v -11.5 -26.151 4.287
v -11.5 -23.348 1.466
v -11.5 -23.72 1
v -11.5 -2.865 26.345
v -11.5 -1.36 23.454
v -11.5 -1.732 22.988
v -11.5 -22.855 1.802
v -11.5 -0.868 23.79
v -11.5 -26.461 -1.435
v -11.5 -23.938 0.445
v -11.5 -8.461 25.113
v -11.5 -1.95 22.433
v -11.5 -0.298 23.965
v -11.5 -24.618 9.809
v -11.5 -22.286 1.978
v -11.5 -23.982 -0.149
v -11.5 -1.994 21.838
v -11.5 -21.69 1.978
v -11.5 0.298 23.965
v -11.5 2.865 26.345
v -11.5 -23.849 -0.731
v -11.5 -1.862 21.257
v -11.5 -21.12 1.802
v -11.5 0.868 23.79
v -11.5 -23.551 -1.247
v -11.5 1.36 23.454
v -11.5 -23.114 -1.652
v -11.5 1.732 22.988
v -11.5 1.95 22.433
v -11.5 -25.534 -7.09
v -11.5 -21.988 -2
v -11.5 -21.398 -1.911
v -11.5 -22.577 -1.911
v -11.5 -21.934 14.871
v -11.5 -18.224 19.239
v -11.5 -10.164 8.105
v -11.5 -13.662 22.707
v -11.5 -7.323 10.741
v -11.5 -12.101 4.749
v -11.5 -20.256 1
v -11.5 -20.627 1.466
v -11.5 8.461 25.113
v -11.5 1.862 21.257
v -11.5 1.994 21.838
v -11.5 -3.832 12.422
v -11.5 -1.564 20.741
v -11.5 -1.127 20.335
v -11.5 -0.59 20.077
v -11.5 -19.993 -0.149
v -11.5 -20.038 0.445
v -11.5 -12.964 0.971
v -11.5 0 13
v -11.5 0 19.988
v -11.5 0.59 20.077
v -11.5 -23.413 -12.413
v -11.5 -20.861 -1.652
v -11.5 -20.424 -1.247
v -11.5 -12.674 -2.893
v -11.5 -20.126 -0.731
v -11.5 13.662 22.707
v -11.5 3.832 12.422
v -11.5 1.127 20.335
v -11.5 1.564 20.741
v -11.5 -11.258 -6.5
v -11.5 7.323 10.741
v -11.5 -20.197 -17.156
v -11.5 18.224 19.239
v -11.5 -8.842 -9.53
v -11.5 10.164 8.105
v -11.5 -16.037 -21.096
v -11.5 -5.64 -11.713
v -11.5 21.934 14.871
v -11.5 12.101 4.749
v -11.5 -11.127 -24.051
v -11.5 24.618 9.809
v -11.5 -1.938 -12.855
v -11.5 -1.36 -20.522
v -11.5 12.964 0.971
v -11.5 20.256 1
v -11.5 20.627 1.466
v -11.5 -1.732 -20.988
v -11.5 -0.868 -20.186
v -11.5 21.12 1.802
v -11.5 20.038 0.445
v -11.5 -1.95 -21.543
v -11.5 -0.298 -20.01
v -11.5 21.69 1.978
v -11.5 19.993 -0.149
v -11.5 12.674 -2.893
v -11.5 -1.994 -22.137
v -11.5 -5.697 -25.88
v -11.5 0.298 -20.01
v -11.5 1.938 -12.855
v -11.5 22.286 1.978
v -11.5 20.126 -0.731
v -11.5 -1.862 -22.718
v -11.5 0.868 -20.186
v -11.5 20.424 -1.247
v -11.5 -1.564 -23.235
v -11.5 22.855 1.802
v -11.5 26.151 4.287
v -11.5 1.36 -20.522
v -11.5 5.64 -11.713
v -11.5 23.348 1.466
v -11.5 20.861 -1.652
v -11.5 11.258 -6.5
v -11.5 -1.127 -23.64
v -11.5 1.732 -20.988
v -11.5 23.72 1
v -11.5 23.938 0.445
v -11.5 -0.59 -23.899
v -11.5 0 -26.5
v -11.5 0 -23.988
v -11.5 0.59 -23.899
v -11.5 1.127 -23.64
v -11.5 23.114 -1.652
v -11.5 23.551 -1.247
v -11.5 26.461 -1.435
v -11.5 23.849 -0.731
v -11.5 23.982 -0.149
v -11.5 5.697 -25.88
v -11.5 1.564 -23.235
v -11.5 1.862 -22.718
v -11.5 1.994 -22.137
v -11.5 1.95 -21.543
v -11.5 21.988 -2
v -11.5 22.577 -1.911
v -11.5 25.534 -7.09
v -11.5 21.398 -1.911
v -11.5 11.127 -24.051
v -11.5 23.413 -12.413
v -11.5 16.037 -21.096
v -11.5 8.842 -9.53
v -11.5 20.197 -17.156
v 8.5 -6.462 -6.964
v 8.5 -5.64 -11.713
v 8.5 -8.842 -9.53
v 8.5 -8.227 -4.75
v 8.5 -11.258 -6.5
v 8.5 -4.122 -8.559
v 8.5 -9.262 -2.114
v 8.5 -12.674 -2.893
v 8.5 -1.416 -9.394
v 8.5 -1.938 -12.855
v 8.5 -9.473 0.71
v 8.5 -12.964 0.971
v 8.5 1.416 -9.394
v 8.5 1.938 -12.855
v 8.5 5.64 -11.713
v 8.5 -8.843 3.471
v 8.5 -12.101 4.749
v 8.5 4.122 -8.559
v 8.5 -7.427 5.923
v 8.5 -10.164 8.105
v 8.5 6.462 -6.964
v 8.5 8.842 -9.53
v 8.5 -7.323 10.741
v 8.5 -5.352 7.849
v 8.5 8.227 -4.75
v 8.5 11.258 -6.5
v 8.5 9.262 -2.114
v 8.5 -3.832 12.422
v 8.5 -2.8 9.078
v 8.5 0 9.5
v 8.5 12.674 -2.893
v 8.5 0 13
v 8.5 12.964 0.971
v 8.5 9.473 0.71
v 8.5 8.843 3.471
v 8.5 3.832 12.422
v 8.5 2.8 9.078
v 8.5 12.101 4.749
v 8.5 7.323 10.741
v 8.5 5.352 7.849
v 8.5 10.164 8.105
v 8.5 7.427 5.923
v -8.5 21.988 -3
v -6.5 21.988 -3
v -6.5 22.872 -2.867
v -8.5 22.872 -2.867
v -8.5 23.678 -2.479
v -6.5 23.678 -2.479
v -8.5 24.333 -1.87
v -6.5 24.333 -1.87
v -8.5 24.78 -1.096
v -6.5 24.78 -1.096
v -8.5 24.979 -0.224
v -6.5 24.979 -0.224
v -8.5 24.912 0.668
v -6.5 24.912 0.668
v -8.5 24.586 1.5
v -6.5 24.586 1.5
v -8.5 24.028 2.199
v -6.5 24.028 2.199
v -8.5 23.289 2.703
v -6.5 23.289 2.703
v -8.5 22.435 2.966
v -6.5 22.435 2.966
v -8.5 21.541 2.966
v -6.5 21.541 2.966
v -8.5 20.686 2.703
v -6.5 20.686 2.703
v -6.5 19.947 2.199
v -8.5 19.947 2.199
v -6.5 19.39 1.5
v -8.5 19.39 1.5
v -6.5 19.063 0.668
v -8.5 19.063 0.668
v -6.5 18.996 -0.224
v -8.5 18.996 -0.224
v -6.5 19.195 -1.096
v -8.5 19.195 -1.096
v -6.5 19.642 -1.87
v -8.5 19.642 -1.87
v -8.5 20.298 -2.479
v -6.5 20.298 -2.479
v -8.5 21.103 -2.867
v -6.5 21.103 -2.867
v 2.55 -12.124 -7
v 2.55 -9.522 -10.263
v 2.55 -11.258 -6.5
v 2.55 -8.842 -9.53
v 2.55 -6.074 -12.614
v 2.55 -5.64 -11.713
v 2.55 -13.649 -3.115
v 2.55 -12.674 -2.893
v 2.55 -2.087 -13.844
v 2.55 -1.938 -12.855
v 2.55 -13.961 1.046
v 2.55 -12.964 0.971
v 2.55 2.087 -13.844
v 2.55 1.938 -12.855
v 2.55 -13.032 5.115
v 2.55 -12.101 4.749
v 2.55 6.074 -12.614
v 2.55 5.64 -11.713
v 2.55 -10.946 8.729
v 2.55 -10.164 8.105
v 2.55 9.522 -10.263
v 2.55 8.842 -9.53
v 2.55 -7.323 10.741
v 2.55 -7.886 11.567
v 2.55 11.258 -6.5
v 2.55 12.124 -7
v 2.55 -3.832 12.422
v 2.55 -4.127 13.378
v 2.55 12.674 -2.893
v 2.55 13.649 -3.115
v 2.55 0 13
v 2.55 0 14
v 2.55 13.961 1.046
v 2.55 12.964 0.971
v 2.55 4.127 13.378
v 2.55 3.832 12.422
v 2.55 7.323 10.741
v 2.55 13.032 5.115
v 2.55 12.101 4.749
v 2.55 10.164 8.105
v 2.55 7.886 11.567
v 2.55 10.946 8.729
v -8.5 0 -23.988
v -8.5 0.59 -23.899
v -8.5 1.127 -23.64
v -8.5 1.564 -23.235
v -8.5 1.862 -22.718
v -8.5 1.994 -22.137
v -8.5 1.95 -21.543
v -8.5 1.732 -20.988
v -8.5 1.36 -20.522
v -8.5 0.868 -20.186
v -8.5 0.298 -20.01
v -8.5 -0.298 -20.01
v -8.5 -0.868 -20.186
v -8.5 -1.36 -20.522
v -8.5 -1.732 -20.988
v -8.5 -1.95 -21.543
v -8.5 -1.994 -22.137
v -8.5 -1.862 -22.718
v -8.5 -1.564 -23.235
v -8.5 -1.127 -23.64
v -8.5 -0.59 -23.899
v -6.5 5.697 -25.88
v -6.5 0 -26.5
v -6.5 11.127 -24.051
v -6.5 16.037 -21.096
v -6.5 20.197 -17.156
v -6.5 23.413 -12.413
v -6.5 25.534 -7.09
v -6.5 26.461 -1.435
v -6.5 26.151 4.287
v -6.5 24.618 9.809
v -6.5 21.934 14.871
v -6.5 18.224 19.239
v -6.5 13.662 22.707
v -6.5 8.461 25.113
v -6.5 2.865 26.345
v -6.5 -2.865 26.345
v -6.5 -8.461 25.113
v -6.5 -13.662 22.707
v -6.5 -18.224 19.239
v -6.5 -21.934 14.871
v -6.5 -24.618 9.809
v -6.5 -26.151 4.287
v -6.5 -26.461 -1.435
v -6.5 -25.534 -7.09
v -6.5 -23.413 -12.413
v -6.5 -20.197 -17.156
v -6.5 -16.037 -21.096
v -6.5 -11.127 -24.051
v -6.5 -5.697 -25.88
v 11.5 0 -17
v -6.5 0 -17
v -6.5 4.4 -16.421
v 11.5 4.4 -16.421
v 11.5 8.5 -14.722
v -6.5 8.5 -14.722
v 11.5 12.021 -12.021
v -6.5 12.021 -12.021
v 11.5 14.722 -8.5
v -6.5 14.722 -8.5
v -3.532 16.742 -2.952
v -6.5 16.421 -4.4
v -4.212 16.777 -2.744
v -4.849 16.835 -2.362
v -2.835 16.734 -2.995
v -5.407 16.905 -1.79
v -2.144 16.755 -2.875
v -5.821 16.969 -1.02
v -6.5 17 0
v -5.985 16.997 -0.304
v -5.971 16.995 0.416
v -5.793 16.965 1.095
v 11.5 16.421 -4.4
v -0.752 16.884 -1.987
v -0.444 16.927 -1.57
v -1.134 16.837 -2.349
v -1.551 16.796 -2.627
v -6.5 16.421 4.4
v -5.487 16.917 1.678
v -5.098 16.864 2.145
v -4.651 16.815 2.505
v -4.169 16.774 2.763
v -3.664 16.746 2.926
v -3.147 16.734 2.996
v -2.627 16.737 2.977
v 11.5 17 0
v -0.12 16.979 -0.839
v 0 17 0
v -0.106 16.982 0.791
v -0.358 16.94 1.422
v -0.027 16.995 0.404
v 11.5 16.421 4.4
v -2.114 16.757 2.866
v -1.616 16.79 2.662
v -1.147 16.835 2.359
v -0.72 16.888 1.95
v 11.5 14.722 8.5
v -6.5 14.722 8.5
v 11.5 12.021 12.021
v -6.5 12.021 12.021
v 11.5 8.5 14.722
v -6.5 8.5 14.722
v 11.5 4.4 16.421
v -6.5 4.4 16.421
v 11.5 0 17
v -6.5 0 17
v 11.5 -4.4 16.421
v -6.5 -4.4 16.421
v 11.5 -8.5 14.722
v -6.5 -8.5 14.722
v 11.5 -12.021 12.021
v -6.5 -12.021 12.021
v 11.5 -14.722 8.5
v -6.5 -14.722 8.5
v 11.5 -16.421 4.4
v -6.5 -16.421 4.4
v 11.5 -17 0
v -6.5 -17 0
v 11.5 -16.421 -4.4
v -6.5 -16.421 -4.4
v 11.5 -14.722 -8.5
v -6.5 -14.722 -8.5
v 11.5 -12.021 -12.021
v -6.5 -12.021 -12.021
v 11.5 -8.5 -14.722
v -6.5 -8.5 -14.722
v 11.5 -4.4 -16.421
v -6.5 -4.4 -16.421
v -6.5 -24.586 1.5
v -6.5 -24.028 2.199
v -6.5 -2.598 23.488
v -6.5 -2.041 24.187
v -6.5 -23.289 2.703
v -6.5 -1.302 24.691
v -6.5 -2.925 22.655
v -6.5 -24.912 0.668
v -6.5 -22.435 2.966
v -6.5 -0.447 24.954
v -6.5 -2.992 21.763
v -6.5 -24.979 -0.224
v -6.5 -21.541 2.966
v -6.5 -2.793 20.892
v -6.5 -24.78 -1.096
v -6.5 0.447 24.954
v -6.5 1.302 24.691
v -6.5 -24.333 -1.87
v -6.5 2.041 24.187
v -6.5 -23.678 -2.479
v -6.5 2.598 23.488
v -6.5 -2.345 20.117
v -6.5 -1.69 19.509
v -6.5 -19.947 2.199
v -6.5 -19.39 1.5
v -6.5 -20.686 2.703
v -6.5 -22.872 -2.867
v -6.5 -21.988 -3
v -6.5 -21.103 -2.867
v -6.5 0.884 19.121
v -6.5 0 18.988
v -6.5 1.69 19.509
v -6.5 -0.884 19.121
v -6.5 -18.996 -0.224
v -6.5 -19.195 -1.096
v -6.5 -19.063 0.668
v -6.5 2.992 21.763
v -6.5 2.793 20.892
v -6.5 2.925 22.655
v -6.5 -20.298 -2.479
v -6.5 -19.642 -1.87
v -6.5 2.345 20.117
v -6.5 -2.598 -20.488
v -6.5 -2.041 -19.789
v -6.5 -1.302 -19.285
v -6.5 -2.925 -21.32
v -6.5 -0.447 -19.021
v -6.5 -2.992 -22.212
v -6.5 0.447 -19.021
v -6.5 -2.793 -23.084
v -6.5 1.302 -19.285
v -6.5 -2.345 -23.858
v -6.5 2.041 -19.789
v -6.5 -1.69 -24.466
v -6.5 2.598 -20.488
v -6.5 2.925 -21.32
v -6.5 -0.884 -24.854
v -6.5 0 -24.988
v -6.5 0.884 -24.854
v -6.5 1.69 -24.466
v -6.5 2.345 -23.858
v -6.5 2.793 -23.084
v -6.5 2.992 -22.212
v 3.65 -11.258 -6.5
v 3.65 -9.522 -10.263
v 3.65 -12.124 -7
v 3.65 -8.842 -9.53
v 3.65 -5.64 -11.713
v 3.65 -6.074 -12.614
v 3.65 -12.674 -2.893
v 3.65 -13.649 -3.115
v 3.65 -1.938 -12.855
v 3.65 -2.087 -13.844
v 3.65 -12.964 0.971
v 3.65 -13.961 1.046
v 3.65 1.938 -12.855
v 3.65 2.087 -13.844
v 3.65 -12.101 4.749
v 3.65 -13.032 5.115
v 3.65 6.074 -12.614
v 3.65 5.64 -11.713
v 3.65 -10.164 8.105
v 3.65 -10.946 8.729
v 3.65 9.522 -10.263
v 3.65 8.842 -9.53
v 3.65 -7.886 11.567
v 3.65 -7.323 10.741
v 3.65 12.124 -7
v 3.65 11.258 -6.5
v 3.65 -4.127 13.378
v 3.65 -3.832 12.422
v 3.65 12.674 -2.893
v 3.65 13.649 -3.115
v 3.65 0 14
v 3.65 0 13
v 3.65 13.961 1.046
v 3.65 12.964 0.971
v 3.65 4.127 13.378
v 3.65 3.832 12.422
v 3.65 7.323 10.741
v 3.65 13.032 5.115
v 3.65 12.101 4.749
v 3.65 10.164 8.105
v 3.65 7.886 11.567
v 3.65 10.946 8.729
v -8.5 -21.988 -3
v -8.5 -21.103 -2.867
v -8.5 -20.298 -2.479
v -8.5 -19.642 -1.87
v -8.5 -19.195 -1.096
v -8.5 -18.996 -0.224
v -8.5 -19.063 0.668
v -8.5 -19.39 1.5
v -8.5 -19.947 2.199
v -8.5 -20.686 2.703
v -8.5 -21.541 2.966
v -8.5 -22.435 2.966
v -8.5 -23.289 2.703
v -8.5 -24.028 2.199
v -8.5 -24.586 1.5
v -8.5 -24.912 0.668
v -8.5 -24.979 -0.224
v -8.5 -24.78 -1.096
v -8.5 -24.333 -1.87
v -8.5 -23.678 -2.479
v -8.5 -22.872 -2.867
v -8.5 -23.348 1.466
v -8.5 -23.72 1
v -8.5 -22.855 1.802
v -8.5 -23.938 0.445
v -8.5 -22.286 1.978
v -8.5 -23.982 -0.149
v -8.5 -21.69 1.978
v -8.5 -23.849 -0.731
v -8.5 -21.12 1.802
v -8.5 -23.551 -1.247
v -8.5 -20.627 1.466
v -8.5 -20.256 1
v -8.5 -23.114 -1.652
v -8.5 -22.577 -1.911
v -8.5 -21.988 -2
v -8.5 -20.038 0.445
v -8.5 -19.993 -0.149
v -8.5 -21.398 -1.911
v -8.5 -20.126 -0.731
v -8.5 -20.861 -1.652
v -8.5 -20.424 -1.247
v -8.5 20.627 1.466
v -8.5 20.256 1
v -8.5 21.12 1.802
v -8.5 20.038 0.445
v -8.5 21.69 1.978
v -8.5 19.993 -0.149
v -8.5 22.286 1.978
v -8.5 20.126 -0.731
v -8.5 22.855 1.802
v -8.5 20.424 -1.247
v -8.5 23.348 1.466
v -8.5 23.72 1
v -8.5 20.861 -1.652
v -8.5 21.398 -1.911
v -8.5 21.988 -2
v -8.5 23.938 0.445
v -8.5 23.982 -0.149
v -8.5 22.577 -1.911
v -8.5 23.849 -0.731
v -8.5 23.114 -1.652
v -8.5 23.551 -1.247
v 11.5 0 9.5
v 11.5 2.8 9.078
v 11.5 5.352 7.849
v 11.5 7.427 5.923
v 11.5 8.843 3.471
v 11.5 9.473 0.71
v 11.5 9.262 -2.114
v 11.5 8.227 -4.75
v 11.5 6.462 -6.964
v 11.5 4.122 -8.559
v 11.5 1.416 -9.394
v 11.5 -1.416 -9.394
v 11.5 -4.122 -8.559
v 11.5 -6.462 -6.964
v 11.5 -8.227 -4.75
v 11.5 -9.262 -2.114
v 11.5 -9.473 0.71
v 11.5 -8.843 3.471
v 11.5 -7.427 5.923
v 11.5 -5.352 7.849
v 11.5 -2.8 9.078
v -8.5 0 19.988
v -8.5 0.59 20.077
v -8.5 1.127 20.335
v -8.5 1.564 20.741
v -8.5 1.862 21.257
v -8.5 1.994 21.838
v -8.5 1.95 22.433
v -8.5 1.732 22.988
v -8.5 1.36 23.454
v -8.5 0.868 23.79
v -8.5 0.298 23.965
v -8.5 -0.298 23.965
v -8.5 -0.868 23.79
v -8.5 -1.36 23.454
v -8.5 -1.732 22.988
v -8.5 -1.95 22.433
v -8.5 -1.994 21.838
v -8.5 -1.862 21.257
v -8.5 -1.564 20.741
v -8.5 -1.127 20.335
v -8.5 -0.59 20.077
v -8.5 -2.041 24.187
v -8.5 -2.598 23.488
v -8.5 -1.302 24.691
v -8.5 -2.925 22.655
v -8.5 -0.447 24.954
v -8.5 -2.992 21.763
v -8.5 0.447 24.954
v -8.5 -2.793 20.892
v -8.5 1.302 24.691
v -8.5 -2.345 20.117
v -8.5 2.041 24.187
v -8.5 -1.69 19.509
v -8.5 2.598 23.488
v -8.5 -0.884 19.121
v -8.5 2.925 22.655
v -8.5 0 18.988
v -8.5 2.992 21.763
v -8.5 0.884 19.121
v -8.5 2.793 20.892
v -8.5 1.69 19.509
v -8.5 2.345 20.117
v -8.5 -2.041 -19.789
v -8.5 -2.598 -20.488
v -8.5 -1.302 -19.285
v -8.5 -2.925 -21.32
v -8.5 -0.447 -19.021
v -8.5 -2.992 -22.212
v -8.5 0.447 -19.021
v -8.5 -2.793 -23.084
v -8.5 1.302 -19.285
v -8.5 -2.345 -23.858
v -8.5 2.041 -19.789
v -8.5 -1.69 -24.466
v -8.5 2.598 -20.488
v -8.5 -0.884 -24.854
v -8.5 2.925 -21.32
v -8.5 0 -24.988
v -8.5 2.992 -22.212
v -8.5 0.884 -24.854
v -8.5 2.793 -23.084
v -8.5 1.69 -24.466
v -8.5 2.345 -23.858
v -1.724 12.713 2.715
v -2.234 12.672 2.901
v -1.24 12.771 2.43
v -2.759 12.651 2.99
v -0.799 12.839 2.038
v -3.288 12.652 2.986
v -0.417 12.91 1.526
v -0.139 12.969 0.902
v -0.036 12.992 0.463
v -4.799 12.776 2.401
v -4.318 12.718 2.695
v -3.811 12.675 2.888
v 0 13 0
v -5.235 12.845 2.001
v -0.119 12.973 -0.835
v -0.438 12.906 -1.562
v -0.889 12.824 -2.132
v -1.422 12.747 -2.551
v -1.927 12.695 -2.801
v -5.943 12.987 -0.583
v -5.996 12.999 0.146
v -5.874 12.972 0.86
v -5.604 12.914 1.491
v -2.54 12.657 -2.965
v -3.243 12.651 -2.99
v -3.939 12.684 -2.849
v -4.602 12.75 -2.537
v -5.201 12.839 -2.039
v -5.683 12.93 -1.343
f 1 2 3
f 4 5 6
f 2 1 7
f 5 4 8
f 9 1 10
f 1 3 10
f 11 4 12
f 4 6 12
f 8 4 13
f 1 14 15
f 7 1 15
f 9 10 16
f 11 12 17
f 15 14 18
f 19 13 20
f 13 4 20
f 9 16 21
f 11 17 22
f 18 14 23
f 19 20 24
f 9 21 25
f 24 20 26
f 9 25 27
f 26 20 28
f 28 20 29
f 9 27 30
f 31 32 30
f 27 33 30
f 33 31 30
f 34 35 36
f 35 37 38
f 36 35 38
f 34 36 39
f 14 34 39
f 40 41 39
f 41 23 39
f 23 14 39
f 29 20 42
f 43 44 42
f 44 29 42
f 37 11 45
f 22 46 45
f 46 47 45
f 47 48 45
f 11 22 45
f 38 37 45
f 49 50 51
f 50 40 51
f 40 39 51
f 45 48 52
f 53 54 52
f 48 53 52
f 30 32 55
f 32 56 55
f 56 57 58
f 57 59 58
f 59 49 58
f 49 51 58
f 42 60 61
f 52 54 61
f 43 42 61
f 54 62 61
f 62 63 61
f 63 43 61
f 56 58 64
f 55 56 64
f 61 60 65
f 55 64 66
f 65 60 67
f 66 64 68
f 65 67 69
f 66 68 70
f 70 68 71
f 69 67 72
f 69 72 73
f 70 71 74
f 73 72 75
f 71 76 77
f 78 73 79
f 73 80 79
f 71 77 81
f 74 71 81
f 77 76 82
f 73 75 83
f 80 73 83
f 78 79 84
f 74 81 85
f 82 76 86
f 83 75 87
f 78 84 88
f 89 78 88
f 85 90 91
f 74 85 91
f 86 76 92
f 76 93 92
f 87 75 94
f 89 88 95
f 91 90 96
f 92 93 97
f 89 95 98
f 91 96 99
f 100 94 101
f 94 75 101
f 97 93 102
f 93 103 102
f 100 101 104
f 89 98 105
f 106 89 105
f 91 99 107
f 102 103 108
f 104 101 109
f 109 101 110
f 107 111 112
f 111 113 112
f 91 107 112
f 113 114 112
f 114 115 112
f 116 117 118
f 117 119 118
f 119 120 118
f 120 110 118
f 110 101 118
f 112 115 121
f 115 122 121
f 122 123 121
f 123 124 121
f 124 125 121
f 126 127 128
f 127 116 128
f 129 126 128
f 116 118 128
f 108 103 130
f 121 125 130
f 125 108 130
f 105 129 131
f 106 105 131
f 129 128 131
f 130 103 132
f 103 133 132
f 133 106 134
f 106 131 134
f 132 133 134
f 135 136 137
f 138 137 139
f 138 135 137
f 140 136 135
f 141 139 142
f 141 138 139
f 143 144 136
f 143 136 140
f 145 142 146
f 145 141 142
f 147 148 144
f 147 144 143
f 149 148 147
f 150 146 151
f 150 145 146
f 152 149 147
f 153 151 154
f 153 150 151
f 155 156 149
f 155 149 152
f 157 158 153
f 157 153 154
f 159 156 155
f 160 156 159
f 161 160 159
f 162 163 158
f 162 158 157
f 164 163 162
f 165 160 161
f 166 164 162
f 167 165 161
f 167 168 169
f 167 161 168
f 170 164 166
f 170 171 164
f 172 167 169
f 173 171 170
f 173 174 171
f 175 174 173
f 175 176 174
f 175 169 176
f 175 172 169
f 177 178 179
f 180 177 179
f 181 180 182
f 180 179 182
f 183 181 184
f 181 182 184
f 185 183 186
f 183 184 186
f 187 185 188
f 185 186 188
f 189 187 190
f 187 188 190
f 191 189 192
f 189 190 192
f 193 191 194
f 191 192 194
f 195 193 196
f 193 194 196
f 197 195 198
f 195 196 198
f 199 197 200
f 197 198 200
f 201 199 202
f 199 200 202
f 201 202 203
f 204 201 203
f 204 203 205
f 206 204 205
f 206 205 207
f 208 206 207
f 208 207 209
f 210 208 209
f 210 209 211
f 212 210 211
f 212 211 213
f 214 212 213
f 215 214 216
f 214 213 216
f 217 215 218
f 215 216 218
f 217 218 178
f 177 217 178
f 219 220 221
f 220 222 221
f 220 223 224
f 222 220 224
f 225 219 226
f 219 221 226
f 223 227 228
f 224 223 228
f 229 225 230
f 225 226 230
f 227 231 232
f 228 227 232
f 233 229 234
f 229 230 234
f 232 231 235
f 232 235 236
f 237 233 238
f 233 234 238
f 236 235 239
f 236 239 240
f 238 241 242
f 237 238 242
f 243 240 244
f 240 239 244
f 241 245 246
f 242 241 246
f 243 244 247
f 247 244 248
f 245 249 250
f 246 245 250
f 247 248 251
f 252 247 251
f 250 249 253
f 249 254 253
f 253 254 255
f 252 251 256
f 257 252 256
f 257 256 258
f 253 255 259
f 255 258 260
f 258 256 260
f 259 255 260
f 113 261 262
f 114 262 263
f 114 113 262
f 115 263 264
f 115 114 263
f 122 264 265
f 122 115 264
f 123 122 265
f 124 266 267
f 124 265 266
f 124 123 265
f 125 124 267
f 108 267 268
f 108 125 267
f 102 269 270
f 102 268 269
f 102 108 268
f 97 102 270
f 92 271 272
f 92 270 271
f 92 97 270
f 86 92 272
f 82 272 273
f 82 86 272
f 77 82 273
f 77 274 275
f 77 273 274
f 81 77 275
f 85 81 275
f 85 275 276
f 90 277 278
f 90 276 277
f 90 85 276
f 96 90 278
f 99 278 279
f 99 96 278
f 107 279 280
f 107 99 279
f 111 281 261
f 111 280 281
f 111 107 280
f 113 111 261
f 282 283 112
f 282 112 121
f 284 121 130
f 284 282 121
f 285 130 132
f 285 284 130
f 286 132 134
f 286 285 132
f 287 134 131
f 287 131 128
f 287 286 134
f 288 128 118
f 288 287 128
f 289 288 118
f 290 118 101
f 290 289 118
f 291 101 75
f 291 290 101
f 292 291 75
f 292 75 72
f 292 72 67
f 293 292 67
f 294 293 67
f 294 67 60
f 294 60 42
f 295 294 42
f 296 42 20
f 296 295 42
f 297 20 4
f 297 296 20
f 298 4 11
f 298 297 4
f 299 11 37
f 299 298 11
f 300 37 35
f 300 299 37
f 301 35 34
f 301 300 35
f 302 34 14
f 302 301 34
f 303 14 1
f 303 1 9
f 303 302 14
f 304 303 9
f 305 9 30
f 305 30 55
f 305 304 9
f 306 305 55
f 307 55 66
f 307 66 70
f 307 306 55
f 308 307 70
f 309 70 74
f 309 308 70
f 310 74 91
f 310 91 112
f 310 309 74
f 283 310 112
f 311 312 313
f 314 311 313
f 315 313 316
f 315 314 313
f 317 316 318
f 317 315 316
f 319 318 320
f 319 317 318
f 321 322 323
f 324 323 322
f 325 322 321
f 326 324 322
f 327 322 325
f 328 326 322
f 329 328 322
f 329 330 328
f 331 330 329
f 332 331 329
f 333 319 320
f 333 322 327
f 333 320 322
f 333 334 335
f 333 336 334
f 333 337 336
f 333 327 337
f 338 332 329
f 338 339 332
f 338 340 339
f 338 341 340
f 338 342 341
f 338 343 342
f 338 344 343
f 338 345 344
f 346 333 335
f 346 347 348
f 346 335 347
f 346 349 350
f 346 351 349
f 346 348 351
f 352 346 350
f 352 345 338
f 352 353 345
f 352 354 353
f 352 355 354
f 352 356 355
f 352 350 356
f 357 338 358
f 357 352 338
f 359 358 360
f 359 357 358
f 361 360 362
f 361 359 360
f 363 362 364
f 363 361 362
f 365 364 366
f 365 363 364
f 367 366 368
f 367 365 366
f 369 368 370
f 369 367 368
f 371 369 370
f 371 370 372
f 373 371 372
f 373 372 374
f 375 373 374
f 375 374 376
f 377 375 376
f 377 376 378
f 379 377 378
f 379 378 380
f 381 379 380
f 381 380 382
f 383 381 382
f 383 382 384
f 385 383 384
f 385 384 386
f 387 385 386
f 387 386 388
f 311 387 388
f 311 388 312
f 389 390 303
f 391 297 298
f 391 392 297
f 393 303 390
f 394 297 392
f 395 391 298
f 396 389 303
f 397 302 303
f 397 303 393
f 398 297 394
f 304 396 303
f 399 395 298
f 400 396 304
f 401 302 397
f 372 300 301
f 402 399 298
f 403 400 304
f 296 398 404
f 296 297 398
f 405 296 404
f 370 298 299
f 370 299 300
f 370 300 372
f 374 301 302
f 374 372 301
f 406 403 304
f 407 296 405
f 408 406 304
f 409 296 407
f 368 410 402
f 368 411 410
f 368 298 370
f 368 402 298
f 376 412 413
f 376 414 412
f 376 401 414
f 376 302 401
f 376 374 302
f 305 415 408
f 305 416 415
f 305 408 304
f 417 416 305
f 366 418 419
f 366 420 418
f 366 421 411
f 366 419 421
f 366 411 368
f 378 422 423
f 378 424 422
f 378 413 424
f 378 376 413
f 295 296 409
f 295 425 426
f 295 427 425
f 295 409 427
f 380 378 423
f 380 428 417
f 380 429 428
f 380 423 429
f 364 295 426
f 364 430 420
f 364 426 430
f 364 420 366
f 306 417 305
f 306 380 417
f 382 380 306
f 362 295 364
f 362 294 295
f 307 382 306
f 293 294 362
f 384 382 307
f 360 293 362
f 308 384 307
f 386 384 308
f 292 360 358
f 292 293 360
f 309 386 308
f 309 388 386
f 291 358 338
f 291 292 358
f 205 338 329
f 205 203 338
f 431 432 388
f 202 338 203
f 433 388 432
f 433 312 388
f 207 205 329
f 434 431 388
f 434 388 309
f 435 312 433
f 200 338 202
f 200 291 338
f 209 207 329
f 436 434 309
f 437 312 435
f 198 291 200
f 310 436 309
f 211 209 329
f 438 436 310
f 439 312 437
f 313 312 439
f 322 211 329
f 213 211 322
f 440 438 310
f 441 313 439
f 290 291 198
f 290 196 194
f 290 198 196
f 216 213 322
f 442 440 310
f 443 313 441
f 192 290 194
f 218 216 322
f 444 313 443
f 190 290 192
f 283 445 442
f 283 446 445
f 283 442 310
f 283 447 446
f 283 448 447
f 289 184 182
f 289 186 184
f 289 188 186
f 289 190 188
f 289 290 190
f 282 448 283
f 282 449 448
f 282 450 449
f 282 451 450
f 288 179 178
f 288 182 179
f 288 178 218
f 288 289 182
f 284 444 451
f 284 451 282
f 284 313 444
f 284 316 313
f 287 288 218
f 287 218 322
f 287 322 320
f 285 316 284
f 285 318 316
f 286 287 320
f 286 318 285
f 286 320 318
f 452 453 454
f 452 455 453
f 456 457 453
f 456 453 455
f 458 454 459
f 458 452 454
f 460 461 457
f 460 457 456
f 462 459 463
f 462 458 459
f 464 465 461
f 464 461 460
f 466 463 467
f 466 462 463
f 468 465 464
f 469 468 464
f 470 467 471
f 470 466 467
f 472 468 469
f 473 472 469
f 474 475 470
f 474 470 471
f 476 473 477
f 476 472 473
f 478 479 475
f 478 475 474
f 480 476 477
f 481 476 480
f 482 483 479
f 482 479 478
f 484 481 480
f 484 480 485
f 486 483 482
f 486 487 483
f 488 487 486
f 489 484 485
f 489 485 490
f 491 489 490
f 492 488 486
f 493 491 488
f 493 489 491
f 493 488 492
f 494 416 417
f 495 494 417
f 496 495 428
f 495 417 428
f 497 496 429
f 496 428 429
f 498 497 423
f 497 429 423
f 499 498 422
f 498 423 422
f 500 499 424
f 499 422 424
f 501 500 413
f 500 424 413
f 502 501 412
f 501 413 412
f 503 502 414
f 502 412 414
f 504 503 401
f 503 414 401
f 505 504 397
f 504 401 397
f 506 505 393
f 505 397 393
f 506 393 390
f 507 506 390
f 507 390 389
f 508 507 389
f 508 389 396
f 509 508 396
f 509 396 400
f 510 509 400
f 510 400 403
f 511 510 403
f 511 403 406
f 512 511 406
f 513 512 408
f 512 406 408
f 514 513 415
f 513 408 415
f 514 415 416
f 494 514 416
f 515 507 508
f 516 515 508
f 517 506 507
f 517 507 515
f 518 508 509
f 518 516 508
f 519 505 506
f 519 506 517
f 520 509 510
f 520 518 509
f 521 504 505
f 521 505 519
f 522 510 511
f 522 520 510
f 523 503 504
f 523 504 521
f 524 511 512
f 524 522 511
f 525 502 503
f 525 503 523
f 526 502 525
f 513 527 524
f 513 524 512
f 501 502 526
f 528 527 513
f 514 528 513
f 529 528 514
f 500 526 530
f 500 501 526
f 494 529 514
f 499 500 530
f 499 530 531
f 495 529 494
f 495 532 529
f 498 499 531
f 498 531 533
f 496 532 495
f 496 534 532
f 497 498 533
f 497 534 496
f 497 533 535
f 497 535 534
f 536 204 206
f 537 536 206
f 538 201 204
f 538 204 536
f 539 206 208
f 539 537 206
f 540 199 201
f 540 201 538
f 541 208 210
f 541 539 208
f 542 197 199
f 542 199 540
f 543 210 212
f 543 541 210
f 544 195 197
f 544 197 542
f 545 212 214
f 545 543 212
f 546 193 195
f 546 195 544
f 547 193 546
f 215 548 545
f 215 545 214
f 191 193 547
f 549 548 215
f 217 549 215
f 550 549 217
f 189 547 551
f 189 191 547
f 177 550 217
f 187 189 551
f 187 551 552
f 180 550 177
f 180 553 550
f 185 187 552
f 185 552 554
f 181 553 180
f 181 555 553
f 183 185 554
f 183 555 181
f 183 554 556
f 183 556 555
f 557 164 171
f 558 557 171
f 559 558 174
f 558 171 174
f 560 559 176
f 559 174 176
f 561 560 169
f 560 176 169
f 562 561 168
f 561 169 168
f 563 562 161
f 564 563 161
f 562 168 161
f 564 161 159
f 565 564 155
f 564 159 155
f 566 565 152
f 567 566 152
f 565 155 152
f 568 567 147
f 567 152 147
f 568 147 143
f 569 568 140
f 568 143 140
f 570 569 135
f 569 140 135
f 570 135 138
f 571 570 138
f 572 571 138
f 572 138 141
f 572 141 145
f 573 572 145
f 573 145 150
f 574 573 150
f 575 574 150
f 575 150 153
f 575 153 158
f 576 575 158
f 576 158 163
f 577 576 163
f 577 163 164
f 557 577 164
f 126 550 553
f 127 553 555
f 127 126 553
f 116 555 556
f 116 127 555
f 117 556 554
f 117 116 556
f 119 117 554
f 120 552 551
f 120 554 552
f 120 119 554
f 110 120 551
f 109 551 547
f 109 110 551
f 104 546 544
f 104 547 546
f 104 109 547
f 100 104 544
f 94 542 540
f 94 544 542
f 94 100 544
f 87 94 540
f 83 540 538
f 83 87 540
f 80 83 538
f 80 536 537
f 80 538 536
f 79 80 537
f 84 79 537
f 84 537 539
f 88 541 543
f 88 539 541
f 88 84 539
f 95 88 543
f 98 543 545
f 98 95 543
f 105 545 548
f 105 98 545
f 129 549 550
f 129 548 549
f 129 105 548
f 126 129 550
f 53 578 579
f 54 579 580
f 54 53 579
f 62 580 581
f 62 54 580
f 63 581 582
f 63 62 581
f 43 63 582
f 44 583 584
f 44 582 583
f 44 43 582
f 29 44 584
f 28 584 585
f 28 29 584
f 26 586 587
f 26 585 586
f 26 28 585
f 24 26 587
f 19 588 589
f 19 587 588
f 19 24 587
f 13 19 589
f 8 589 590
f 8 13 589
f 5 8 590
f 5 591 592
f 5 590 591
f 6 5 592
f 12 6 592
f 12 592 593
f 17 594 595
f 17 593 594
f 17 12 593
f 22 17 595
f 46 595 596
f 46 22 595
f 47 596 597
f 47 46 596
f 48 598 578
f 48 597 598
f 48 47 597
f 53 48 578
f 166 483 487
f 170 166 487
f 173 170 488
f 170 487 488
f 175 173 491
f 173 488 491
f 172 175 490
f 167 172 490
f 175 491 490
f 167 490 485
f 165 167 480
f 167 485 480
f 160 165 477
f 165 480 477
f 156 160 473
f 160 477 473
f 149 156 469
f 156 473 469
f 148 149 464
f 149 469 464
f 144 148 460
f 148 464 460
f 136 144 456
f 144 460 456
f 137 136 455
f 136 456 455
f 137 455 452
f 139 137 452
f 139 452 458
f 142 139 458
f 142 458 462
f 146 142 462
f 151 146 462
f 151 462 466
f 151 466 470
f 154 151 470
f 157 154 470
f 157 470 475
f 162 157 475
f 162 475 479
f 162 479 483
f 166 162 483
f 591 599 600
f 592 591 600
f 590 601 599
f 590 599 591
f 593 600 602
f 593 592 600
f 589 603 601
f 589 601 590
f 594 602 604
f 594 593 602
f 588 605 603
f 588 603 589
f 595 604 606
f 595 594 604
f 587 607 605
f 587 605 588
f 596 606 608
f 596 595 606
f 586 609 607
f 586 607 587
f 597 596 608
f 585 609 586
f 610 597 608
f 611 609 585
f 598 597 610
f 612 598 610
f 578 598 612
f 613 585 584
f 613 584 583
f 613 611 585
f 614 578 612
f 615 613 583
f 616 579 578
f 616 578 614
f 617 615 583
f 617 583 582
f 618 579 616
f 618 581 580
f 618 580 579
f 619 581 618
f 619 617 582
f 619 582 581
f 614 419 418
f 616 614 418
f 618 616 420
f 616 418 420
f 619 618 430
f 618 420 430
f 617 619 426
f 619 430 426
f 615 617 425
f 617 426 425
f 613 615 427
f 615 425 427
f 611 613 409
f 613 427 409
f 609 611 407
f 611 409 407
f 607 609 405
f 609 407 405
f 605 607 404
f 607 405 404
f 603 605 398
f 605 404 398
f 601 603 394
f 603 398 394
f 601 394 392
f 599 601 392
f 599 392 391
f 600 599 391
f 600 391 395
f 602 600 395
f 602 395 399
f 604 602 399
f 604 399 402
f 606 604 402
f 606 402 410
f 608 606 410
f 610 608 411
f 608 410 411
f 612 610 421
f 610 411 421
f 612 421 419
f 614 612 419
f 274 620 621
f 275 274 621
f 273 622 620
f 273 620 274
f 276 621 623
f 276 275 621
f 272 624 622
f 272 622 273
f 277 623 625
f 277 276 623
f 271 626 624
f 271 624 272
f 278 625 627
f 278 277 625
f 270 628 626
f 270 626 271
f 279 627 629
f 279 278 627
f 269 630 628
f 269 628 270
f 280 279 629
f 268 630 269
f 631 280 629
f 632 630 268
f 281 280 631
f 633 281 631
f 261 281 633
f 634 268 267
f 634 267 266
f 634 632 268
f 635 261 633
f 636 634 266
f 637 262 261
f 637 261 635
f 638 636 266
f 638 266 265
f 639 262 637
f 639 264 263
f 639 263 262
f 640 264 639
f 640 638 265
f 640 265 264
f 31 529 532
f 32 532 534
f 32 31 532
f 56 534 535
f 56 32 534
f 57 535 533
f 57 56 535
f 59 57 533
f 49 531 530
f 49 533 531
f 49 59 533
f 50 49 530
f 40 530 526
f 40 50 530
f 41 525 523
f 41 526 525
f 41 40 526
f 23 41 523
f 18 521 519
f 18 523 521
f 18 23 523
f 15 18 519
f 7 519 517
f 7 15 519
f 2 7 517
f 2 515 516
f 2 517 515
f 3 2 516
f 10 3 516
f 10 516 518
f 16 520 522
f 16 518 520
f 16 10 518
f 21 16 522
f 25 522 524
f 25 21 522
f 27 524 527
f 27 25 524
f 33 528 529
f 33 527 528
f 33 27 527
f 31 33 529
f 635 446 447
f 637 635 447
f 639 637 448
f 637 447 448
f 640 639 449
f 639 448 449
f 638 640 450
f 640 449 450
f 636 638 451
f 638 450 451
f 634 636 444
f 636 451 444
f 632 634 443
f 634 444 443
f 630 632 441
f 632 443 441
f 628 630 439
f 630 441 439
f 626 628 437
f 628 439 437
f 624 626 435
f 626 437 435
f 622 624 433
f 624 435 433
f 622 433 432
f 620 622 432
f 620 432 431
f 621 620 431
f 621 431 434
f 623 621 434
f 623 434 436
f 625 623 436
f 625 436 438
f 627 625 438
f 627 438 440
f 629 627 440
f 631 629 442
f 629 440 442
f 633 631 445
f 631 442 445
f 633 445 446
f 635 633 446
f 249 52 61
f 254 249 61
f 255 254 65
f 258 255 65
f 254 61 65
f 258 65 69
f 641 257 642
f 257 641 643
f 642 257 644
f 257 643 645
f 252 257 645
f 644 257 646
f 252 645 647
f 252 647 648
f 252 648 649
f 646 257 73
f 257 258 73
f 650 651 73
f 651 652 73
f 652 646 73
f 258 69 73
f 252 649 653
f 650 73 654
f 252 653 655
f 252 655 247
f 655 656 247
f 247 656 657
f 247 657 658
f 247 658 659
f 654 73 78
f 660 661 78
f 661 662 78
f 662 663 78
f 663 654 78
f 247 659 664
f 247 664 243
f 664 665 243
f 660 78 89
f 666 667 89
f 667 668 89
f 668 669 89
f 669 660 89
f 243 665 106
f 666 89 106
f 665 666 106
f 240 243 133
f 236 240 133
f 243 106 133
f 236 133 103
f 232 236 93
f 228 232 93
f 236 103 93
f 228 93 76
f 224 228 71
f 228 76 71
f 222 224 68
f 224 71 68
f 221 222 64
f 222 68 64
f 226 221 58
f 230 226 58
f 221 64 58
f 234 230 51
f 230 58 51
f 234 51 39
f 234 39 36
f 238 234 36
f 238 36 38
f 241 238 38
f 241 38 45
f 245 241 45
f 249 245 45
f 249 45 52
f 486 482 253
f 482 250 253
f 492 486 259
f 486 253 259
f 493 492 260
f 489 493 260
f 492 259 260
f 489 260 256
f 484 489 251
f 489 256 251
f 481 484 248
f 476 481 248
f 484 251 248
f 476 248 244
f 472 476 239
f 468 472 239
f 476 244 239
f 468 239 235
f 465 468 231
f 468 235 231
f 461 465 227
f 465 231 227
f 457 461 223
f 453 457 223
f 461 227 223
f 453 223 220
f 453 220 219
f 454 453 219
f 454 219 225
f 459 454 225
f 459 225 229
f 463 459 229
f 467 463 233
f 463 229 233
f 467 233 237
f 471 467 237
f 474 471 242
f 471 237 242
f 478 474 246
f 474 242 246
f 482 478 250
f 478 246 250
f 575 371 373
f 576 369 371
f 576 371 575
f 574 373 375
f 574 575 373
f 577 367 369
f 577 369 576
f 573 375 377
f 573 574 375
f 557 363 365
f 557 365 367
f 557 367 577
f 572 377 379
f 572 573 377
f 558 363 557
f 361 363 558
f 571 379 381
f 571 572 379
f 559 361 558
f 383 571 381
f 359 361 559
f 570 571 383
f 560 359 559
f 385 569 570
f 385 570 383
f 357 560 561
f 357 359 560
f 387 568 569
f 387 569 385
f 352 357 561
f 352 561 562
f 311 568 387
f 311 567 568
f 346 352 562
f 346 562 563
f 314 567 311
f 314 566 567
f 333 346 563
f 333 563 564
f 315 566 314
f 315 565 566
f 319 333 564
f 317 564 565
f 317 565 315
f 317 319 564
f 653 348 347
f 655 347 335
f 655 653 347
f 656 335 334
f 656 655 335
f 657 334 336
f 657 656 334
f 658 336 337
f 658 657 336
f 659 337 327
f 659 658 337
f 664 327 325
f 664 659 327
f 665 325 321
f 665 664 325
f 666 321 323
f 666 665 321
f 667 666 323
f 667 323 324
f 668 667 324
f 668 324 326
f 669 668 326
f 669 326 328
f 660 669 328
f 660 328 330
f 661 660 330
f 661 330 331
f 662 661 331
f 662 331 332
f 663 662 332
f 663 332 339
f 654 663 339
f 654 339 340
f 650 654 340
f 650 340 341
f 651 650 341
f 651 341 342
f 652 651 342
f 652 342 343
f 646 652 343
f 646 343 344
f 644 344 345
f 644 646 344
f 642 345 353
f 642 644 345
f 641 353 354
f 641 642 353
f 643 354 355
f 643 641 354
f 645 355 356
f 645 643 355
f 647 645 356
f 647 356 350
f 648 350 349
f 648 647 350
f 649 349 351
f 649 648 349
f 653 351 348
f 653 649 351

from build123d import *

# Parameters (mm, degrees)
SKETCH1_R           = 26.5
SKETCH1_R_2         = 2
BOSS_EXTRUDE1_DEPTH = 11.5
CUT_EXTRUDE1_START  = -18
SKETCH2_R           = 26.5
SKETCH2_R_2         = 2
SKETCH2_R_3         = 17
CUT_EXTRUDE1_DEPTH  = 18
SKETCH3_R           = 13
CUT_EXTRUDE2_DEPTH  = 20
SKETCH4_R           = 9.5
CUT_EXTRUDE3_DEPTH  = 20
SKETCH5_R           = 14
CUT_EXTRUDE4_DEPTH  = 0.55
SKETCH6_R           = 3
CUT_EXTRUDE5_DEPTH  = 33
SKETCH9_R           = 3
CUT_EXTRUDE7_DEPTH  = 2


with BuildPart() as part:
    # Sketch1 → Boss-Extrude1 (new, symmetric)
    with BuildSketch(Plane(origin=(0, 0, 0), x_dir=(0, 0, -1), z_dir=(1, 0, 0))):
        Circle(SKETCH1_R)
        with Locations((0, -21.987670406)):
            Circle(SKETCH1_R_2, mode=Mode.SUBTRACT)
        with Locations((-21.987670406, 0)):
            Circle(SKETCH1_R_2, mode=Mode.SUBTRACT)
        with Locations((0, 21.987670406)):
            Circle(SKETCH1_R_2, mode=Mode.SUBTRACT)
        with Locations((21.987670406, 0)):
            Circle(SKETCH1_R_2, mode=Mode.SUBTRACT)
    extrude(amount=BOSS_EXTRUDE1_DEPTH, both=True)

    # Sketch2 → Cut-Extrude1 (cut)
    with BuildSketch(Plane(origin=(11.5, 0, 0), x_dir=(0, 0, -1), z_dir=(1, 0, 0)).offset(CUT_EXTRUDE1_START)):
        Circle(SKETCH2_R)
        with Locations((0, -21.987670406)):
            Circle(SKETCH2_R_2, mode=Mode.SUBTRACT)
        with Locations((-21.987670406, 0)):
            Circle(SKETCH2_R_2, mode=Mode.SUBTRACT)
        with Locations((0, 21.987670406)):
            Circle(SKETCH2_R_2, mode=Mode.SUBTRACT)
        Circle(SKETCH2_R_3, mode=Mode.SUBTRACT)
        with Locations((21.987670406, 0)):
            Circle(SKETCH2_R_2, mode=Mode.SUBTRACT)
    extrude(amount=CUT_EXTRUDE1_DEPTH, mode=Mode.SUBTRACT)

    # Sketch3 → Cut-Extrude2 (cut)
    with BuildSketch(Plane.ZY.offset(11.5)):
        Circle(SKETCH3_R)
    extrude(amount=-CUT_EXTRUDE2_DEPTH, mode=Mode.SUBTRACT)

    # Sketch4 → Cut-Extrude3 (cut)
    with BuildSketch(Plane.ZY.offset(-8.5)):
        Circle(SKETCH4_R)
    extrude(amount=-CUT_EXTRUDE3_DEPTH, mode=Mode.SUBTRACT)

    # Sketch5 → Cut-Extrude4 (cut, symmetric)
    with BuildSketch(Plane.ZY.offset(-3.1)):
        Circle(SKETCH5_R)
    extrude(amount=CUT_EXTRUDE4_DEPTH, both=True, mode=Mode.SUBTRACT)

    # Sketch6 → Cut-Extrude5 (cut)
    with BuildSketch(Plane(origin=(0, 0, 0), x_dir=(1, 0, 0), z_dir=(0, 1, 0))):
        with Locations((-3, 0)):
            Circle(SKETCH6_R)
    extrude(amount=CUT_EXTRUDE5_DEPTH, mode=Mode.SUBTRACT)

    # Sketch9 → Cut-Extrude7 (cut)
    with BuildSketch(Plane(origin=(-6.5, 0, 0), x_dir=(0, 0, -1), z_dir=(1, 0, 0))):
        with Locations((0, 21.987670406)):
            Circle(SKETCH9_R)
        with Locations((21.987670406, 0)):
            Circle(SKETCH9_R)
        with Locations((0, -21.987670406)):
            Circle(SKETCH9_R)
        with Locations((-21.987670406, 0)):
            Circle(SKETCH9_R)
    extrude(amount=-CUT_EXTRUDE7_DEPTH, mode=Mode.SUBTRACT)


solid = part.part
